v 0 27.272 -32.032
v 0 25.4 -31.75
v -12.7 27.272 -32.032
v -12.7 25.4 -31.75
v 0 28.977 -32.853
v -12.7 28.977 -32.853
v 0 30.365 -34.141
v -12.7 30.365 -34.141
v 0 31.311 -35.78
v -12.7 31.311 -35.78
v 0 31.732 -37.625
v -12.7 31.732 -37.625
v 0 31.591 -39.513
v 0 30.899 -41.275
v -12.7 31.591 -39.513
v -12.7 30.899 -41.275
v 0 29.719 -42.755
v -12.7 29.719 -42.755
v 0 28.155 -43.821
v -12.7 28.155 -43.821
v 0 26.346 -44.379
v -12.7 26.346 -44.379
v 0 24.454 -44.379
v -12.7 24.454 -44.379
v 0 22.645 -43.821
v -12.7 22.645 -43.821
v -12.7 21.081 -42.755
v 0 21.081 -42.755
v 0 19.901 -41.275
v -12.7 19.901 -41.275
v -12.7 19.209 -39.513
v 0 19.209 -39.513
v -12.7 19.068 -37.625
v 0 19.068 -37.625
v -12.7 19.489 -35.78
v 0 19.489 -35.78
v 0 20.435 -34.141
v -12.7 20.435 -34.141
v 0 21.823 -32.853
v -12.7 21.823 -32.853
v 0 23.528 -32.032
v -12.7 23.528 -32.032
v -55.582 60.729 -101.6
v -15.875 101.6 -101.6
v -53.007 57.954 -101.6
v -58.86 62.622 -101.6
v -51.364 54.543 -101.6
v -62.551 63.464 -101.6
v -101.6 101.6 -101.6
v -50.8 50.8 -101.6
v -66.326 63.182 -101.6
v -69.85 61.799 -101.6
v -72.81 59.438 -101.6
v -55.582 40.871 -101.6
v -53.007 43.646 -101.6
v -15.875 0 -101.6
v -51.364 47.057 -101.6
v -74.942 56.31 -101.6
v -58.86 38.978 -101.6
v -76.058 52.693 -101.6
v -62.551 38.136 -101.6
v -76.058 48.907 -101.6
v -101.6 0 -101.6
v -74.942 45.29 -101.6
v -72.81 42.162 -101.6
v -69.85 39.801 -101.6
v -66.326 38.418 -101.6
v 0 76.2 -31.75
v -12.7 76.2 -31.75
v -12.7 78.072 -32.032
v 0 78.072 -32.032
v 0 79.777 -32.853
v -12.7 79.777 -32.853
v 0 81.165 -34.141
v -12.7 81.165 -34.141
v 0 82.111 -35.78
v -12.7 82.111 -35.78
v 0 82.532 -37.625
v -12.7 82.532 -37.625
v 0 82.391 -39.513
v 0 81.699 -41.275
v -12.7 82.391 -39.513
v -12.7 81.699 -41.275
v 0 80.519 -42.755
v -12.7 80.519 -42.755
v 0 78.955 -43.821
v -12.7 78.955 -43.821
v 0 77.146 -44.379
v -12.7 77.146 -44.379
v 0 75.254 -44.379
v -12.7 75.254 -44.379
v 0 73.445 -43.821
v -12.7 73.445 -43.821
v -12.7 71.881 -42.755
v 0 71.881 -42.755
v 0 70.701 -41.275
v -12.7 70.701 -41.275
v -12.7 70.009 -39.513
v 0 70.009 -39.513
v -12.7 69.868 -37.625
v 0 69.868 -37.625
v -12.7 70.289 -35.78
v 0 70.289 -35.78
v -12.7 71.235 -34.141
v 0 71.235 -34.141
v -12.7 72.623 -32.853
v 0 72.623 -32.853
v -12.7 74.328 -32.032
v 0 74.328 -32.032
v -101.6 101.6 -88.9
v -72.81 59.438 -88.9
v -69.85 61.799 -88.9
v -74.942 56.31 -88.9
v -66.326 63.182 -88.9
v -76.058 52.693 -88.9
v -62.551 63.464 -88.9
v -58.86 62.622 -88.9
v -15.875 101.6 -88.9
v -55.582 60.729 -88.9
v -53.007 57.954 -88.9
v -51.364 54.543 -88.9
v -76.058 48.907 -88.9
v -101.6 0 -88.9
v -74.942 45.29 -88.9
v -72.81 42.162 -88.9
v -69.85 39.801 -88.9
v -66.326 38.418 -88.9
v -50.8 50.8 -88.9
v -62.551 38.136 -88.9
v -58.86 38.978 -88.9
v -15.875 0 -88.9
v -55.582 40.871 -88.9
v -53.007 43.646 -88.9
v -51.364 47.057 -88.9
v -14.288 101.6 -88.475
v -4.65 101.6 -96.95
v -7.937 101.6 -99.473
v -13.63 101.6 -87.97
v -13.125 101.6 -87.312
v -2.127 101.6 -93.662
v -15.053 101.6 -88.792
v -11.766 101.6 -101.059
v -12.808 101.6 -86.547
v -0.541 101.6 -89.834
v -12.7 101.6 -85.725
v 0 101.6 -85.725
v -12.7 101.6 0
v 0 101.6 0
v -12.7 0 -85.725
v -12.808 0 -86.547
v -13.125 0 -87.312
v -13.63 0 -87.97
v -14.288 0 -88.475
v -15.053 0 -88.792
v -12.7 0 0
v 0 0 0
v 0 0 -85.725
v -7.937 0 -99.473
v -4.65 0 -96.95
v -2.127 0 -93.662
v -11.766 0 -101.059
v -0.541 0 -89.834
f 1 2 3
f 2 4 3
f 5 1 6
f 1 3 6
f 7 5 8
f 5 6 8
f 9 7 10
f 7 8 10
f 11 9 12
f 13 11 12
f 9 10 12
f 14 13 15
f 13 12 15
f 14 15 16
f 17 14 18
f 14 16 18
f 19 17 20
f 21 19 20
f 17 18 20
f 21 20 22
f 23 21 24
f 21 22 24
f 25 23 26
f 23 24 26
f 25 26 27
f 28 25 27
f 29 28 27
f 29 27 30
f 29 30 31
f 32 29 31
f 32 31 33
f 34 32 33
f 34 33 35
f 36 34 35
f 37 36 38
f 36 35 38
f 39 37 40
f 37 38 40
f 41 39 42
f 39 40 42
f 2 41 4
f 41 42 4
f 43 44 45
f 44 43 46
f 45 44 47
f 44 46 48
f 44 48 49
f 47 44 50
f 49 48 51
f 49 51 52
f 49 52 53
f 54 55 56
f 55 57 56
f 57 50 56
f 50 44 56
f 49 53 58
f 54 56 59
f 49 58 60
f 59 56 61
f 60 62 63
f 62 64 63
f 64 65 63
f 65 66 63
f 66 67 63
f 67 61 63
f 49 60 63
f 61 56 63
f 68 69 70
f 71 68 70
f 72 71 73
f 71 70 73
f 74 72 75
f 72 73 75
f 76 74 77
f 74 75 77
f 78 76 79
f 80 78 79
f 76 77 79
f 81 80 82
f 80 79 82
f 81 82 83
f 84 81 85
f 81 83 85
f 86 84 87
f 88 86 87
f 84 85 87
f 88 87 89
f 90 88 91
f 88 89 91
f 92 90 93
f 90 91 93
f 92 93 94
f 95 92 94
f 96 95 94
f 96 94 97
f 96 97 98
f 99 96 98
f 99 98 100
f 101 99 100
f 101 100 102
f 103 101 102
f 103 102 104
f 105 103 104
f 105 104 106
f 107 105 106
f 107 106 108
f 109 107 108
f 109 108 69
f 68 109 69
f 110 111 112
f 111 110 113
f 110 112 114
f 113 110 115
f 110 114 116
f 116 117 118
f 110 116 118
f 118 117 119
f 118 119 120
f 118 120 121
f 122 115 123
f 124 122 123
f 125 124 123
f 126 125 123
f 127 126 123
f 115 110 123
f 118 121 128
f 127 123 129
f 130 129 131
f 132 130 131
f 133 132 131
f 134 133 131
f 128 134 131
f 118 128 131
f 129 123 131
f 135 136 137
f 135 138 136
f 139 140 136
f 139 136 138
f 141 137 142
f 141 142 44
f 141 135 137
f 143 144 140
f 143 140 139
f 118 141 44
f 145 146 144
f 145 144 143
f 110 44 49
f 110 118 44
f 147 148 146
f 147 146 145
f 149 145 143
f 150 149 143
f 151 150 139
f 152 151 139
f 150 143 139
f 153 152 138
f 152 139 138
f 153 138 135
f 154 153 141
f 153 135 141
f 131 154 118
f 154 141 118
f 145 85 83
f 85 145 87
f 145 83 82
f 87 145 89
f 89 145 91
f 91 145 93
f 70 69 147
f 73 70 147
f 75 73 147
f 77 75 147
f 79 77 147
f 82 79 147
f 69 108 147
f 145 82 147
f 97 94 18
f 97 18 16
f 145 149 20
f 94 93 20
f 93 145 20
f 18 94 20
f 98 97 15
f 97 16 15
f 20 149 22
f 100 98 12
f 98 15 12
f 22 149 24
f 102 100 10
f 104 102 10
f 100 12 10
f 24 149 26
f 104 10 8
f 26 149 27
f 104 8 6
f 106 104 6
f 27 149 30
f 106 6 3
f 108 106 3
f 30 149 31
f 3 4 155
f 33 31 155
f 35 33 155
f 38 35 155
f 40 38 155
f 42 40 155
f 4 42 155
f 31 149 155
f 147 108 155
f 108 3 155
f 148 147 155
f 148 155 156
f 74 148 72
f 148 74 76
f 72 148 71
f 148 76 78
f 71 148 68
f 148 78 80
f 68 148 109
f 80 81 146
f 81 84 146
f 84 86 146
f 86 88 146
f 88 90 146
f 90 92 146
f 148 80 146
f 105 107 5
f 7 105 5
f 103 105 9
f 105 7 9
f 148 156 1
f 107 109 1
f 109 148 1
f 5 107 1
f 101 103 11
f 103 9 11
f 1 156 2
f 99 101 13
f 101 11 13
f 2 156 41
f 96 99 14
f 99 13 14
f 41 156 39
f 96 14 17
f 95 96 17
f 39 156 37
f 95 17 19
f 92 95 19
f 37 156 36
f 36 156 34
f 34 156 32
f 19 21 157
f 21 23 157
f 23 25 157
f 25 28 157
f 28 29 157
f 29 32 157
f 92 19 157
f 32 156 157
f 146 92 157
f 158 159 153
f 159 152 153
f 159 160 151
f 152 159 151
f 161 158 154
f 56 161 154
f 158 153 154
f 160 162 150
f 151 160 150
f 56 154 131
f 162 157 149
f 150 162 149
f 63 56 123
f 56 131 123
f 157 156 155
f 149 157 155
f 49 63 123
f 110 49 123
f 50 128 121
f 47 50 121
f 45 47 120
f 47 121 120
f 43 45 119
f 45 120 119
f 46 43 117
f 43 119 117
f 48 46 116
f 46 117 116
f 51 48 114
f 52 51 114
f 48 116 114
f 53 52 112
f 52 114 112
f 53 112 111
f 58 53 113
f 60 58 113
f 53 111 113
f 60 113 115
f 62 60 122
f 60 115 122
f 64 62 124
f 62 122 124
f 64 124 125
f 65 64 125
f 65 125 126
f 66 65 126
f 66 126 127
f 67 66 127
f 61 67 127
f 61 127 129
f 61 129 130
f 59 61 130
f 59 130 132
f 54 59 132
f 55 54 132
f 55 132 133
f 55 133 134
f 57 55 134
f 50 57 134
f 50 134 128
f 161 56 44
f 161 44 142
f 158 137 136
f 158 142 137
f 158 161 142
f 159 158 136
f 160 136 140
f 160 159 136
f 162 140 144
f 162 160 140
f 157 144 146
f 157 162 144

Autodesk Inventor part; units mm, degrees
ref_plane "YZ Plane" through (0, 0, 0) normal (1, 0, 0) x (0, 1, 0)
ref_plane "XZ Plane" through (0, 0, 0) normal (0, 1, 0) x (-1, 0, 0)
ref_plane "XY Plane" through (0, 0, 0) normal (0, 0, 1) x (1, 0, 0)
sketch "Sketch1" plane through (0, 0, 0) normal (0, 1, 0) x (-1, 0, 0)
  line L0 (0, 0) -> (0, -85.725)
  line L1 (15.875, -101.6) -> (101.6, -101.6)
  line L2 (101.6, -101.6) -> (101.6, -88.9)
  line L3 (101.6, -88.9) -> (12.7, -88.9)
  line L4 (12.7, -88.9) -> (12.7, 0)
  line L5 (12.7, 0) -> (0, 0)
  arc A0 (0, -85.725) -> (15.875, -101.6) centre (15.875, -85.725) ccw
  arc A1 (0, -85.725) -> (15.875, -101.6) centre (15.875, -85.725) ccw
  point P0 (0, -101.6)
  dimension "d0" = 101.6
  dimension "d1" = 101.6
  dimension "d2" = 12.7
  dimension "d3" = 12.7
  dimension "d4" = 15.875
  dimension "d5" = 15.875
extrude "Extrusion1" add sketch "Sketch1" along normal blind 101.6
sketch "Sketch2" plane through (-12.7, 0, -88.9) normal (-1, 0, 0) x (0, 0, 1)
  circle A0 centre (50.8, 25.4) radius 6.35
  circle A1 centre (50.8, 76.2) radius 6.35
  line L0 (0, 0) -> (88.9, 0) projected
  line L1 (88.9, 0) -> (88.9, 101.6) projected
  dimension "d8" = 12.7
  dimension "d9" = 12.7
  dimension "d10" = 25.4
  dimension "d11" = 50.8
  dimension "d12" = 38.1
  dimension "d13" = 38.1
extrude "Extrusion2" cut sketch "Sketch2" against normal blind 101.6
sketch "Sketch3" plane through (-101.6, 0, -88.9) normal (0, 0, 1) x (1, 0, 0)
  circle A0 centre (38.1, 50.8) radius 12.7
  line L0 (0, 0) -> (0, 101.6) projected
  line L1 (0, 101.6) -> (88.9, 101.6) projected
  point P0 (101.6, 0)
  dimension "d16" = 25.4
  dimension "d17" = 38.1
  dimension "d18" = 50.8
extrude "Extrusion3" cut sketch "Sketch3" against normal blind 101.6
fillet "Fillet1" radius 3.175 1 edges at (-12.7, 50.8, -88.9)
properties part number "Soporte"
